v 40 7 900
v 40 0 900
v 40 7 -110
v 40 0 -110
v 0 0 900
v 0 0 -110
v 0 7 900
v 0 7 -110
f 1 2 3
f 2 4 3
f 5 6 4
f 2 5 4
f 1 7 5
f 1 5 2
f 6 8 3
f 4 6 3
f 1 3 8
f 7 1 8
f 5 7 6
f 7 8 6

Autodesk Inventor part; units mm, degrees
ref_plane "Начальная плоскость" through (0, 0, -110) normal (0, 0, 1) x (1, 0, 0)
ref_plane "Конечная плоскость" through (0, 0, 900) normal (0, 0, 1) x (1, 0, 0)
sketch "Эскиз" plane through (0, 0, 0) normal (0, 0, 1) x (1, 0, 0)
  line L0 (0, 0) -> (40, 0)
  line L1 (40, 0) -> (40, 7)
  line L2 (40, 7) -> (0, 7)
  line L3 (0, 7) -> (0, 0)
  point P0 (0, 0)
extrude "Тело" add sketch "Эскиз" along normal up to surface (1010 mm away) from surface at -110
sketch "Эскиз6" plane through (0, 0, 0) normal (0, 0, 1) x (1, 0, 0)
  line L0 (0, 0) -> (10, 0)
ref_plane "РабПлоскость5" through (0, 0, 0) normal (0, -1, 0) x (1, 0, 0)
sketch "Эскиз7" plane through (0, 0, 0) normal (0, -1, 0) x (1, 0, 0)
  line L0 (-2, -110) -> (12, -110)
  line L1 (-2, 900) -> (12, 900)
  dimension "d17" = 1010
ref_plane "РабПлоскость6" through (-25, -920, -110) normal (0, 0, -1) x (-1, 0, 0)
split "Разделение1" plane through (-25, -920, -110) removes the side toward (0, 0, -1)
ref_plane "РабПлоскость7" through (65, -920, 900) normal (0, 0, 1) x (1, 0, 0)
split "Разделение2" plane through (65, -920, 900) removes the side toward (0, 0, 1)
properties part number "Планка перил 40х7" material "Береза"
